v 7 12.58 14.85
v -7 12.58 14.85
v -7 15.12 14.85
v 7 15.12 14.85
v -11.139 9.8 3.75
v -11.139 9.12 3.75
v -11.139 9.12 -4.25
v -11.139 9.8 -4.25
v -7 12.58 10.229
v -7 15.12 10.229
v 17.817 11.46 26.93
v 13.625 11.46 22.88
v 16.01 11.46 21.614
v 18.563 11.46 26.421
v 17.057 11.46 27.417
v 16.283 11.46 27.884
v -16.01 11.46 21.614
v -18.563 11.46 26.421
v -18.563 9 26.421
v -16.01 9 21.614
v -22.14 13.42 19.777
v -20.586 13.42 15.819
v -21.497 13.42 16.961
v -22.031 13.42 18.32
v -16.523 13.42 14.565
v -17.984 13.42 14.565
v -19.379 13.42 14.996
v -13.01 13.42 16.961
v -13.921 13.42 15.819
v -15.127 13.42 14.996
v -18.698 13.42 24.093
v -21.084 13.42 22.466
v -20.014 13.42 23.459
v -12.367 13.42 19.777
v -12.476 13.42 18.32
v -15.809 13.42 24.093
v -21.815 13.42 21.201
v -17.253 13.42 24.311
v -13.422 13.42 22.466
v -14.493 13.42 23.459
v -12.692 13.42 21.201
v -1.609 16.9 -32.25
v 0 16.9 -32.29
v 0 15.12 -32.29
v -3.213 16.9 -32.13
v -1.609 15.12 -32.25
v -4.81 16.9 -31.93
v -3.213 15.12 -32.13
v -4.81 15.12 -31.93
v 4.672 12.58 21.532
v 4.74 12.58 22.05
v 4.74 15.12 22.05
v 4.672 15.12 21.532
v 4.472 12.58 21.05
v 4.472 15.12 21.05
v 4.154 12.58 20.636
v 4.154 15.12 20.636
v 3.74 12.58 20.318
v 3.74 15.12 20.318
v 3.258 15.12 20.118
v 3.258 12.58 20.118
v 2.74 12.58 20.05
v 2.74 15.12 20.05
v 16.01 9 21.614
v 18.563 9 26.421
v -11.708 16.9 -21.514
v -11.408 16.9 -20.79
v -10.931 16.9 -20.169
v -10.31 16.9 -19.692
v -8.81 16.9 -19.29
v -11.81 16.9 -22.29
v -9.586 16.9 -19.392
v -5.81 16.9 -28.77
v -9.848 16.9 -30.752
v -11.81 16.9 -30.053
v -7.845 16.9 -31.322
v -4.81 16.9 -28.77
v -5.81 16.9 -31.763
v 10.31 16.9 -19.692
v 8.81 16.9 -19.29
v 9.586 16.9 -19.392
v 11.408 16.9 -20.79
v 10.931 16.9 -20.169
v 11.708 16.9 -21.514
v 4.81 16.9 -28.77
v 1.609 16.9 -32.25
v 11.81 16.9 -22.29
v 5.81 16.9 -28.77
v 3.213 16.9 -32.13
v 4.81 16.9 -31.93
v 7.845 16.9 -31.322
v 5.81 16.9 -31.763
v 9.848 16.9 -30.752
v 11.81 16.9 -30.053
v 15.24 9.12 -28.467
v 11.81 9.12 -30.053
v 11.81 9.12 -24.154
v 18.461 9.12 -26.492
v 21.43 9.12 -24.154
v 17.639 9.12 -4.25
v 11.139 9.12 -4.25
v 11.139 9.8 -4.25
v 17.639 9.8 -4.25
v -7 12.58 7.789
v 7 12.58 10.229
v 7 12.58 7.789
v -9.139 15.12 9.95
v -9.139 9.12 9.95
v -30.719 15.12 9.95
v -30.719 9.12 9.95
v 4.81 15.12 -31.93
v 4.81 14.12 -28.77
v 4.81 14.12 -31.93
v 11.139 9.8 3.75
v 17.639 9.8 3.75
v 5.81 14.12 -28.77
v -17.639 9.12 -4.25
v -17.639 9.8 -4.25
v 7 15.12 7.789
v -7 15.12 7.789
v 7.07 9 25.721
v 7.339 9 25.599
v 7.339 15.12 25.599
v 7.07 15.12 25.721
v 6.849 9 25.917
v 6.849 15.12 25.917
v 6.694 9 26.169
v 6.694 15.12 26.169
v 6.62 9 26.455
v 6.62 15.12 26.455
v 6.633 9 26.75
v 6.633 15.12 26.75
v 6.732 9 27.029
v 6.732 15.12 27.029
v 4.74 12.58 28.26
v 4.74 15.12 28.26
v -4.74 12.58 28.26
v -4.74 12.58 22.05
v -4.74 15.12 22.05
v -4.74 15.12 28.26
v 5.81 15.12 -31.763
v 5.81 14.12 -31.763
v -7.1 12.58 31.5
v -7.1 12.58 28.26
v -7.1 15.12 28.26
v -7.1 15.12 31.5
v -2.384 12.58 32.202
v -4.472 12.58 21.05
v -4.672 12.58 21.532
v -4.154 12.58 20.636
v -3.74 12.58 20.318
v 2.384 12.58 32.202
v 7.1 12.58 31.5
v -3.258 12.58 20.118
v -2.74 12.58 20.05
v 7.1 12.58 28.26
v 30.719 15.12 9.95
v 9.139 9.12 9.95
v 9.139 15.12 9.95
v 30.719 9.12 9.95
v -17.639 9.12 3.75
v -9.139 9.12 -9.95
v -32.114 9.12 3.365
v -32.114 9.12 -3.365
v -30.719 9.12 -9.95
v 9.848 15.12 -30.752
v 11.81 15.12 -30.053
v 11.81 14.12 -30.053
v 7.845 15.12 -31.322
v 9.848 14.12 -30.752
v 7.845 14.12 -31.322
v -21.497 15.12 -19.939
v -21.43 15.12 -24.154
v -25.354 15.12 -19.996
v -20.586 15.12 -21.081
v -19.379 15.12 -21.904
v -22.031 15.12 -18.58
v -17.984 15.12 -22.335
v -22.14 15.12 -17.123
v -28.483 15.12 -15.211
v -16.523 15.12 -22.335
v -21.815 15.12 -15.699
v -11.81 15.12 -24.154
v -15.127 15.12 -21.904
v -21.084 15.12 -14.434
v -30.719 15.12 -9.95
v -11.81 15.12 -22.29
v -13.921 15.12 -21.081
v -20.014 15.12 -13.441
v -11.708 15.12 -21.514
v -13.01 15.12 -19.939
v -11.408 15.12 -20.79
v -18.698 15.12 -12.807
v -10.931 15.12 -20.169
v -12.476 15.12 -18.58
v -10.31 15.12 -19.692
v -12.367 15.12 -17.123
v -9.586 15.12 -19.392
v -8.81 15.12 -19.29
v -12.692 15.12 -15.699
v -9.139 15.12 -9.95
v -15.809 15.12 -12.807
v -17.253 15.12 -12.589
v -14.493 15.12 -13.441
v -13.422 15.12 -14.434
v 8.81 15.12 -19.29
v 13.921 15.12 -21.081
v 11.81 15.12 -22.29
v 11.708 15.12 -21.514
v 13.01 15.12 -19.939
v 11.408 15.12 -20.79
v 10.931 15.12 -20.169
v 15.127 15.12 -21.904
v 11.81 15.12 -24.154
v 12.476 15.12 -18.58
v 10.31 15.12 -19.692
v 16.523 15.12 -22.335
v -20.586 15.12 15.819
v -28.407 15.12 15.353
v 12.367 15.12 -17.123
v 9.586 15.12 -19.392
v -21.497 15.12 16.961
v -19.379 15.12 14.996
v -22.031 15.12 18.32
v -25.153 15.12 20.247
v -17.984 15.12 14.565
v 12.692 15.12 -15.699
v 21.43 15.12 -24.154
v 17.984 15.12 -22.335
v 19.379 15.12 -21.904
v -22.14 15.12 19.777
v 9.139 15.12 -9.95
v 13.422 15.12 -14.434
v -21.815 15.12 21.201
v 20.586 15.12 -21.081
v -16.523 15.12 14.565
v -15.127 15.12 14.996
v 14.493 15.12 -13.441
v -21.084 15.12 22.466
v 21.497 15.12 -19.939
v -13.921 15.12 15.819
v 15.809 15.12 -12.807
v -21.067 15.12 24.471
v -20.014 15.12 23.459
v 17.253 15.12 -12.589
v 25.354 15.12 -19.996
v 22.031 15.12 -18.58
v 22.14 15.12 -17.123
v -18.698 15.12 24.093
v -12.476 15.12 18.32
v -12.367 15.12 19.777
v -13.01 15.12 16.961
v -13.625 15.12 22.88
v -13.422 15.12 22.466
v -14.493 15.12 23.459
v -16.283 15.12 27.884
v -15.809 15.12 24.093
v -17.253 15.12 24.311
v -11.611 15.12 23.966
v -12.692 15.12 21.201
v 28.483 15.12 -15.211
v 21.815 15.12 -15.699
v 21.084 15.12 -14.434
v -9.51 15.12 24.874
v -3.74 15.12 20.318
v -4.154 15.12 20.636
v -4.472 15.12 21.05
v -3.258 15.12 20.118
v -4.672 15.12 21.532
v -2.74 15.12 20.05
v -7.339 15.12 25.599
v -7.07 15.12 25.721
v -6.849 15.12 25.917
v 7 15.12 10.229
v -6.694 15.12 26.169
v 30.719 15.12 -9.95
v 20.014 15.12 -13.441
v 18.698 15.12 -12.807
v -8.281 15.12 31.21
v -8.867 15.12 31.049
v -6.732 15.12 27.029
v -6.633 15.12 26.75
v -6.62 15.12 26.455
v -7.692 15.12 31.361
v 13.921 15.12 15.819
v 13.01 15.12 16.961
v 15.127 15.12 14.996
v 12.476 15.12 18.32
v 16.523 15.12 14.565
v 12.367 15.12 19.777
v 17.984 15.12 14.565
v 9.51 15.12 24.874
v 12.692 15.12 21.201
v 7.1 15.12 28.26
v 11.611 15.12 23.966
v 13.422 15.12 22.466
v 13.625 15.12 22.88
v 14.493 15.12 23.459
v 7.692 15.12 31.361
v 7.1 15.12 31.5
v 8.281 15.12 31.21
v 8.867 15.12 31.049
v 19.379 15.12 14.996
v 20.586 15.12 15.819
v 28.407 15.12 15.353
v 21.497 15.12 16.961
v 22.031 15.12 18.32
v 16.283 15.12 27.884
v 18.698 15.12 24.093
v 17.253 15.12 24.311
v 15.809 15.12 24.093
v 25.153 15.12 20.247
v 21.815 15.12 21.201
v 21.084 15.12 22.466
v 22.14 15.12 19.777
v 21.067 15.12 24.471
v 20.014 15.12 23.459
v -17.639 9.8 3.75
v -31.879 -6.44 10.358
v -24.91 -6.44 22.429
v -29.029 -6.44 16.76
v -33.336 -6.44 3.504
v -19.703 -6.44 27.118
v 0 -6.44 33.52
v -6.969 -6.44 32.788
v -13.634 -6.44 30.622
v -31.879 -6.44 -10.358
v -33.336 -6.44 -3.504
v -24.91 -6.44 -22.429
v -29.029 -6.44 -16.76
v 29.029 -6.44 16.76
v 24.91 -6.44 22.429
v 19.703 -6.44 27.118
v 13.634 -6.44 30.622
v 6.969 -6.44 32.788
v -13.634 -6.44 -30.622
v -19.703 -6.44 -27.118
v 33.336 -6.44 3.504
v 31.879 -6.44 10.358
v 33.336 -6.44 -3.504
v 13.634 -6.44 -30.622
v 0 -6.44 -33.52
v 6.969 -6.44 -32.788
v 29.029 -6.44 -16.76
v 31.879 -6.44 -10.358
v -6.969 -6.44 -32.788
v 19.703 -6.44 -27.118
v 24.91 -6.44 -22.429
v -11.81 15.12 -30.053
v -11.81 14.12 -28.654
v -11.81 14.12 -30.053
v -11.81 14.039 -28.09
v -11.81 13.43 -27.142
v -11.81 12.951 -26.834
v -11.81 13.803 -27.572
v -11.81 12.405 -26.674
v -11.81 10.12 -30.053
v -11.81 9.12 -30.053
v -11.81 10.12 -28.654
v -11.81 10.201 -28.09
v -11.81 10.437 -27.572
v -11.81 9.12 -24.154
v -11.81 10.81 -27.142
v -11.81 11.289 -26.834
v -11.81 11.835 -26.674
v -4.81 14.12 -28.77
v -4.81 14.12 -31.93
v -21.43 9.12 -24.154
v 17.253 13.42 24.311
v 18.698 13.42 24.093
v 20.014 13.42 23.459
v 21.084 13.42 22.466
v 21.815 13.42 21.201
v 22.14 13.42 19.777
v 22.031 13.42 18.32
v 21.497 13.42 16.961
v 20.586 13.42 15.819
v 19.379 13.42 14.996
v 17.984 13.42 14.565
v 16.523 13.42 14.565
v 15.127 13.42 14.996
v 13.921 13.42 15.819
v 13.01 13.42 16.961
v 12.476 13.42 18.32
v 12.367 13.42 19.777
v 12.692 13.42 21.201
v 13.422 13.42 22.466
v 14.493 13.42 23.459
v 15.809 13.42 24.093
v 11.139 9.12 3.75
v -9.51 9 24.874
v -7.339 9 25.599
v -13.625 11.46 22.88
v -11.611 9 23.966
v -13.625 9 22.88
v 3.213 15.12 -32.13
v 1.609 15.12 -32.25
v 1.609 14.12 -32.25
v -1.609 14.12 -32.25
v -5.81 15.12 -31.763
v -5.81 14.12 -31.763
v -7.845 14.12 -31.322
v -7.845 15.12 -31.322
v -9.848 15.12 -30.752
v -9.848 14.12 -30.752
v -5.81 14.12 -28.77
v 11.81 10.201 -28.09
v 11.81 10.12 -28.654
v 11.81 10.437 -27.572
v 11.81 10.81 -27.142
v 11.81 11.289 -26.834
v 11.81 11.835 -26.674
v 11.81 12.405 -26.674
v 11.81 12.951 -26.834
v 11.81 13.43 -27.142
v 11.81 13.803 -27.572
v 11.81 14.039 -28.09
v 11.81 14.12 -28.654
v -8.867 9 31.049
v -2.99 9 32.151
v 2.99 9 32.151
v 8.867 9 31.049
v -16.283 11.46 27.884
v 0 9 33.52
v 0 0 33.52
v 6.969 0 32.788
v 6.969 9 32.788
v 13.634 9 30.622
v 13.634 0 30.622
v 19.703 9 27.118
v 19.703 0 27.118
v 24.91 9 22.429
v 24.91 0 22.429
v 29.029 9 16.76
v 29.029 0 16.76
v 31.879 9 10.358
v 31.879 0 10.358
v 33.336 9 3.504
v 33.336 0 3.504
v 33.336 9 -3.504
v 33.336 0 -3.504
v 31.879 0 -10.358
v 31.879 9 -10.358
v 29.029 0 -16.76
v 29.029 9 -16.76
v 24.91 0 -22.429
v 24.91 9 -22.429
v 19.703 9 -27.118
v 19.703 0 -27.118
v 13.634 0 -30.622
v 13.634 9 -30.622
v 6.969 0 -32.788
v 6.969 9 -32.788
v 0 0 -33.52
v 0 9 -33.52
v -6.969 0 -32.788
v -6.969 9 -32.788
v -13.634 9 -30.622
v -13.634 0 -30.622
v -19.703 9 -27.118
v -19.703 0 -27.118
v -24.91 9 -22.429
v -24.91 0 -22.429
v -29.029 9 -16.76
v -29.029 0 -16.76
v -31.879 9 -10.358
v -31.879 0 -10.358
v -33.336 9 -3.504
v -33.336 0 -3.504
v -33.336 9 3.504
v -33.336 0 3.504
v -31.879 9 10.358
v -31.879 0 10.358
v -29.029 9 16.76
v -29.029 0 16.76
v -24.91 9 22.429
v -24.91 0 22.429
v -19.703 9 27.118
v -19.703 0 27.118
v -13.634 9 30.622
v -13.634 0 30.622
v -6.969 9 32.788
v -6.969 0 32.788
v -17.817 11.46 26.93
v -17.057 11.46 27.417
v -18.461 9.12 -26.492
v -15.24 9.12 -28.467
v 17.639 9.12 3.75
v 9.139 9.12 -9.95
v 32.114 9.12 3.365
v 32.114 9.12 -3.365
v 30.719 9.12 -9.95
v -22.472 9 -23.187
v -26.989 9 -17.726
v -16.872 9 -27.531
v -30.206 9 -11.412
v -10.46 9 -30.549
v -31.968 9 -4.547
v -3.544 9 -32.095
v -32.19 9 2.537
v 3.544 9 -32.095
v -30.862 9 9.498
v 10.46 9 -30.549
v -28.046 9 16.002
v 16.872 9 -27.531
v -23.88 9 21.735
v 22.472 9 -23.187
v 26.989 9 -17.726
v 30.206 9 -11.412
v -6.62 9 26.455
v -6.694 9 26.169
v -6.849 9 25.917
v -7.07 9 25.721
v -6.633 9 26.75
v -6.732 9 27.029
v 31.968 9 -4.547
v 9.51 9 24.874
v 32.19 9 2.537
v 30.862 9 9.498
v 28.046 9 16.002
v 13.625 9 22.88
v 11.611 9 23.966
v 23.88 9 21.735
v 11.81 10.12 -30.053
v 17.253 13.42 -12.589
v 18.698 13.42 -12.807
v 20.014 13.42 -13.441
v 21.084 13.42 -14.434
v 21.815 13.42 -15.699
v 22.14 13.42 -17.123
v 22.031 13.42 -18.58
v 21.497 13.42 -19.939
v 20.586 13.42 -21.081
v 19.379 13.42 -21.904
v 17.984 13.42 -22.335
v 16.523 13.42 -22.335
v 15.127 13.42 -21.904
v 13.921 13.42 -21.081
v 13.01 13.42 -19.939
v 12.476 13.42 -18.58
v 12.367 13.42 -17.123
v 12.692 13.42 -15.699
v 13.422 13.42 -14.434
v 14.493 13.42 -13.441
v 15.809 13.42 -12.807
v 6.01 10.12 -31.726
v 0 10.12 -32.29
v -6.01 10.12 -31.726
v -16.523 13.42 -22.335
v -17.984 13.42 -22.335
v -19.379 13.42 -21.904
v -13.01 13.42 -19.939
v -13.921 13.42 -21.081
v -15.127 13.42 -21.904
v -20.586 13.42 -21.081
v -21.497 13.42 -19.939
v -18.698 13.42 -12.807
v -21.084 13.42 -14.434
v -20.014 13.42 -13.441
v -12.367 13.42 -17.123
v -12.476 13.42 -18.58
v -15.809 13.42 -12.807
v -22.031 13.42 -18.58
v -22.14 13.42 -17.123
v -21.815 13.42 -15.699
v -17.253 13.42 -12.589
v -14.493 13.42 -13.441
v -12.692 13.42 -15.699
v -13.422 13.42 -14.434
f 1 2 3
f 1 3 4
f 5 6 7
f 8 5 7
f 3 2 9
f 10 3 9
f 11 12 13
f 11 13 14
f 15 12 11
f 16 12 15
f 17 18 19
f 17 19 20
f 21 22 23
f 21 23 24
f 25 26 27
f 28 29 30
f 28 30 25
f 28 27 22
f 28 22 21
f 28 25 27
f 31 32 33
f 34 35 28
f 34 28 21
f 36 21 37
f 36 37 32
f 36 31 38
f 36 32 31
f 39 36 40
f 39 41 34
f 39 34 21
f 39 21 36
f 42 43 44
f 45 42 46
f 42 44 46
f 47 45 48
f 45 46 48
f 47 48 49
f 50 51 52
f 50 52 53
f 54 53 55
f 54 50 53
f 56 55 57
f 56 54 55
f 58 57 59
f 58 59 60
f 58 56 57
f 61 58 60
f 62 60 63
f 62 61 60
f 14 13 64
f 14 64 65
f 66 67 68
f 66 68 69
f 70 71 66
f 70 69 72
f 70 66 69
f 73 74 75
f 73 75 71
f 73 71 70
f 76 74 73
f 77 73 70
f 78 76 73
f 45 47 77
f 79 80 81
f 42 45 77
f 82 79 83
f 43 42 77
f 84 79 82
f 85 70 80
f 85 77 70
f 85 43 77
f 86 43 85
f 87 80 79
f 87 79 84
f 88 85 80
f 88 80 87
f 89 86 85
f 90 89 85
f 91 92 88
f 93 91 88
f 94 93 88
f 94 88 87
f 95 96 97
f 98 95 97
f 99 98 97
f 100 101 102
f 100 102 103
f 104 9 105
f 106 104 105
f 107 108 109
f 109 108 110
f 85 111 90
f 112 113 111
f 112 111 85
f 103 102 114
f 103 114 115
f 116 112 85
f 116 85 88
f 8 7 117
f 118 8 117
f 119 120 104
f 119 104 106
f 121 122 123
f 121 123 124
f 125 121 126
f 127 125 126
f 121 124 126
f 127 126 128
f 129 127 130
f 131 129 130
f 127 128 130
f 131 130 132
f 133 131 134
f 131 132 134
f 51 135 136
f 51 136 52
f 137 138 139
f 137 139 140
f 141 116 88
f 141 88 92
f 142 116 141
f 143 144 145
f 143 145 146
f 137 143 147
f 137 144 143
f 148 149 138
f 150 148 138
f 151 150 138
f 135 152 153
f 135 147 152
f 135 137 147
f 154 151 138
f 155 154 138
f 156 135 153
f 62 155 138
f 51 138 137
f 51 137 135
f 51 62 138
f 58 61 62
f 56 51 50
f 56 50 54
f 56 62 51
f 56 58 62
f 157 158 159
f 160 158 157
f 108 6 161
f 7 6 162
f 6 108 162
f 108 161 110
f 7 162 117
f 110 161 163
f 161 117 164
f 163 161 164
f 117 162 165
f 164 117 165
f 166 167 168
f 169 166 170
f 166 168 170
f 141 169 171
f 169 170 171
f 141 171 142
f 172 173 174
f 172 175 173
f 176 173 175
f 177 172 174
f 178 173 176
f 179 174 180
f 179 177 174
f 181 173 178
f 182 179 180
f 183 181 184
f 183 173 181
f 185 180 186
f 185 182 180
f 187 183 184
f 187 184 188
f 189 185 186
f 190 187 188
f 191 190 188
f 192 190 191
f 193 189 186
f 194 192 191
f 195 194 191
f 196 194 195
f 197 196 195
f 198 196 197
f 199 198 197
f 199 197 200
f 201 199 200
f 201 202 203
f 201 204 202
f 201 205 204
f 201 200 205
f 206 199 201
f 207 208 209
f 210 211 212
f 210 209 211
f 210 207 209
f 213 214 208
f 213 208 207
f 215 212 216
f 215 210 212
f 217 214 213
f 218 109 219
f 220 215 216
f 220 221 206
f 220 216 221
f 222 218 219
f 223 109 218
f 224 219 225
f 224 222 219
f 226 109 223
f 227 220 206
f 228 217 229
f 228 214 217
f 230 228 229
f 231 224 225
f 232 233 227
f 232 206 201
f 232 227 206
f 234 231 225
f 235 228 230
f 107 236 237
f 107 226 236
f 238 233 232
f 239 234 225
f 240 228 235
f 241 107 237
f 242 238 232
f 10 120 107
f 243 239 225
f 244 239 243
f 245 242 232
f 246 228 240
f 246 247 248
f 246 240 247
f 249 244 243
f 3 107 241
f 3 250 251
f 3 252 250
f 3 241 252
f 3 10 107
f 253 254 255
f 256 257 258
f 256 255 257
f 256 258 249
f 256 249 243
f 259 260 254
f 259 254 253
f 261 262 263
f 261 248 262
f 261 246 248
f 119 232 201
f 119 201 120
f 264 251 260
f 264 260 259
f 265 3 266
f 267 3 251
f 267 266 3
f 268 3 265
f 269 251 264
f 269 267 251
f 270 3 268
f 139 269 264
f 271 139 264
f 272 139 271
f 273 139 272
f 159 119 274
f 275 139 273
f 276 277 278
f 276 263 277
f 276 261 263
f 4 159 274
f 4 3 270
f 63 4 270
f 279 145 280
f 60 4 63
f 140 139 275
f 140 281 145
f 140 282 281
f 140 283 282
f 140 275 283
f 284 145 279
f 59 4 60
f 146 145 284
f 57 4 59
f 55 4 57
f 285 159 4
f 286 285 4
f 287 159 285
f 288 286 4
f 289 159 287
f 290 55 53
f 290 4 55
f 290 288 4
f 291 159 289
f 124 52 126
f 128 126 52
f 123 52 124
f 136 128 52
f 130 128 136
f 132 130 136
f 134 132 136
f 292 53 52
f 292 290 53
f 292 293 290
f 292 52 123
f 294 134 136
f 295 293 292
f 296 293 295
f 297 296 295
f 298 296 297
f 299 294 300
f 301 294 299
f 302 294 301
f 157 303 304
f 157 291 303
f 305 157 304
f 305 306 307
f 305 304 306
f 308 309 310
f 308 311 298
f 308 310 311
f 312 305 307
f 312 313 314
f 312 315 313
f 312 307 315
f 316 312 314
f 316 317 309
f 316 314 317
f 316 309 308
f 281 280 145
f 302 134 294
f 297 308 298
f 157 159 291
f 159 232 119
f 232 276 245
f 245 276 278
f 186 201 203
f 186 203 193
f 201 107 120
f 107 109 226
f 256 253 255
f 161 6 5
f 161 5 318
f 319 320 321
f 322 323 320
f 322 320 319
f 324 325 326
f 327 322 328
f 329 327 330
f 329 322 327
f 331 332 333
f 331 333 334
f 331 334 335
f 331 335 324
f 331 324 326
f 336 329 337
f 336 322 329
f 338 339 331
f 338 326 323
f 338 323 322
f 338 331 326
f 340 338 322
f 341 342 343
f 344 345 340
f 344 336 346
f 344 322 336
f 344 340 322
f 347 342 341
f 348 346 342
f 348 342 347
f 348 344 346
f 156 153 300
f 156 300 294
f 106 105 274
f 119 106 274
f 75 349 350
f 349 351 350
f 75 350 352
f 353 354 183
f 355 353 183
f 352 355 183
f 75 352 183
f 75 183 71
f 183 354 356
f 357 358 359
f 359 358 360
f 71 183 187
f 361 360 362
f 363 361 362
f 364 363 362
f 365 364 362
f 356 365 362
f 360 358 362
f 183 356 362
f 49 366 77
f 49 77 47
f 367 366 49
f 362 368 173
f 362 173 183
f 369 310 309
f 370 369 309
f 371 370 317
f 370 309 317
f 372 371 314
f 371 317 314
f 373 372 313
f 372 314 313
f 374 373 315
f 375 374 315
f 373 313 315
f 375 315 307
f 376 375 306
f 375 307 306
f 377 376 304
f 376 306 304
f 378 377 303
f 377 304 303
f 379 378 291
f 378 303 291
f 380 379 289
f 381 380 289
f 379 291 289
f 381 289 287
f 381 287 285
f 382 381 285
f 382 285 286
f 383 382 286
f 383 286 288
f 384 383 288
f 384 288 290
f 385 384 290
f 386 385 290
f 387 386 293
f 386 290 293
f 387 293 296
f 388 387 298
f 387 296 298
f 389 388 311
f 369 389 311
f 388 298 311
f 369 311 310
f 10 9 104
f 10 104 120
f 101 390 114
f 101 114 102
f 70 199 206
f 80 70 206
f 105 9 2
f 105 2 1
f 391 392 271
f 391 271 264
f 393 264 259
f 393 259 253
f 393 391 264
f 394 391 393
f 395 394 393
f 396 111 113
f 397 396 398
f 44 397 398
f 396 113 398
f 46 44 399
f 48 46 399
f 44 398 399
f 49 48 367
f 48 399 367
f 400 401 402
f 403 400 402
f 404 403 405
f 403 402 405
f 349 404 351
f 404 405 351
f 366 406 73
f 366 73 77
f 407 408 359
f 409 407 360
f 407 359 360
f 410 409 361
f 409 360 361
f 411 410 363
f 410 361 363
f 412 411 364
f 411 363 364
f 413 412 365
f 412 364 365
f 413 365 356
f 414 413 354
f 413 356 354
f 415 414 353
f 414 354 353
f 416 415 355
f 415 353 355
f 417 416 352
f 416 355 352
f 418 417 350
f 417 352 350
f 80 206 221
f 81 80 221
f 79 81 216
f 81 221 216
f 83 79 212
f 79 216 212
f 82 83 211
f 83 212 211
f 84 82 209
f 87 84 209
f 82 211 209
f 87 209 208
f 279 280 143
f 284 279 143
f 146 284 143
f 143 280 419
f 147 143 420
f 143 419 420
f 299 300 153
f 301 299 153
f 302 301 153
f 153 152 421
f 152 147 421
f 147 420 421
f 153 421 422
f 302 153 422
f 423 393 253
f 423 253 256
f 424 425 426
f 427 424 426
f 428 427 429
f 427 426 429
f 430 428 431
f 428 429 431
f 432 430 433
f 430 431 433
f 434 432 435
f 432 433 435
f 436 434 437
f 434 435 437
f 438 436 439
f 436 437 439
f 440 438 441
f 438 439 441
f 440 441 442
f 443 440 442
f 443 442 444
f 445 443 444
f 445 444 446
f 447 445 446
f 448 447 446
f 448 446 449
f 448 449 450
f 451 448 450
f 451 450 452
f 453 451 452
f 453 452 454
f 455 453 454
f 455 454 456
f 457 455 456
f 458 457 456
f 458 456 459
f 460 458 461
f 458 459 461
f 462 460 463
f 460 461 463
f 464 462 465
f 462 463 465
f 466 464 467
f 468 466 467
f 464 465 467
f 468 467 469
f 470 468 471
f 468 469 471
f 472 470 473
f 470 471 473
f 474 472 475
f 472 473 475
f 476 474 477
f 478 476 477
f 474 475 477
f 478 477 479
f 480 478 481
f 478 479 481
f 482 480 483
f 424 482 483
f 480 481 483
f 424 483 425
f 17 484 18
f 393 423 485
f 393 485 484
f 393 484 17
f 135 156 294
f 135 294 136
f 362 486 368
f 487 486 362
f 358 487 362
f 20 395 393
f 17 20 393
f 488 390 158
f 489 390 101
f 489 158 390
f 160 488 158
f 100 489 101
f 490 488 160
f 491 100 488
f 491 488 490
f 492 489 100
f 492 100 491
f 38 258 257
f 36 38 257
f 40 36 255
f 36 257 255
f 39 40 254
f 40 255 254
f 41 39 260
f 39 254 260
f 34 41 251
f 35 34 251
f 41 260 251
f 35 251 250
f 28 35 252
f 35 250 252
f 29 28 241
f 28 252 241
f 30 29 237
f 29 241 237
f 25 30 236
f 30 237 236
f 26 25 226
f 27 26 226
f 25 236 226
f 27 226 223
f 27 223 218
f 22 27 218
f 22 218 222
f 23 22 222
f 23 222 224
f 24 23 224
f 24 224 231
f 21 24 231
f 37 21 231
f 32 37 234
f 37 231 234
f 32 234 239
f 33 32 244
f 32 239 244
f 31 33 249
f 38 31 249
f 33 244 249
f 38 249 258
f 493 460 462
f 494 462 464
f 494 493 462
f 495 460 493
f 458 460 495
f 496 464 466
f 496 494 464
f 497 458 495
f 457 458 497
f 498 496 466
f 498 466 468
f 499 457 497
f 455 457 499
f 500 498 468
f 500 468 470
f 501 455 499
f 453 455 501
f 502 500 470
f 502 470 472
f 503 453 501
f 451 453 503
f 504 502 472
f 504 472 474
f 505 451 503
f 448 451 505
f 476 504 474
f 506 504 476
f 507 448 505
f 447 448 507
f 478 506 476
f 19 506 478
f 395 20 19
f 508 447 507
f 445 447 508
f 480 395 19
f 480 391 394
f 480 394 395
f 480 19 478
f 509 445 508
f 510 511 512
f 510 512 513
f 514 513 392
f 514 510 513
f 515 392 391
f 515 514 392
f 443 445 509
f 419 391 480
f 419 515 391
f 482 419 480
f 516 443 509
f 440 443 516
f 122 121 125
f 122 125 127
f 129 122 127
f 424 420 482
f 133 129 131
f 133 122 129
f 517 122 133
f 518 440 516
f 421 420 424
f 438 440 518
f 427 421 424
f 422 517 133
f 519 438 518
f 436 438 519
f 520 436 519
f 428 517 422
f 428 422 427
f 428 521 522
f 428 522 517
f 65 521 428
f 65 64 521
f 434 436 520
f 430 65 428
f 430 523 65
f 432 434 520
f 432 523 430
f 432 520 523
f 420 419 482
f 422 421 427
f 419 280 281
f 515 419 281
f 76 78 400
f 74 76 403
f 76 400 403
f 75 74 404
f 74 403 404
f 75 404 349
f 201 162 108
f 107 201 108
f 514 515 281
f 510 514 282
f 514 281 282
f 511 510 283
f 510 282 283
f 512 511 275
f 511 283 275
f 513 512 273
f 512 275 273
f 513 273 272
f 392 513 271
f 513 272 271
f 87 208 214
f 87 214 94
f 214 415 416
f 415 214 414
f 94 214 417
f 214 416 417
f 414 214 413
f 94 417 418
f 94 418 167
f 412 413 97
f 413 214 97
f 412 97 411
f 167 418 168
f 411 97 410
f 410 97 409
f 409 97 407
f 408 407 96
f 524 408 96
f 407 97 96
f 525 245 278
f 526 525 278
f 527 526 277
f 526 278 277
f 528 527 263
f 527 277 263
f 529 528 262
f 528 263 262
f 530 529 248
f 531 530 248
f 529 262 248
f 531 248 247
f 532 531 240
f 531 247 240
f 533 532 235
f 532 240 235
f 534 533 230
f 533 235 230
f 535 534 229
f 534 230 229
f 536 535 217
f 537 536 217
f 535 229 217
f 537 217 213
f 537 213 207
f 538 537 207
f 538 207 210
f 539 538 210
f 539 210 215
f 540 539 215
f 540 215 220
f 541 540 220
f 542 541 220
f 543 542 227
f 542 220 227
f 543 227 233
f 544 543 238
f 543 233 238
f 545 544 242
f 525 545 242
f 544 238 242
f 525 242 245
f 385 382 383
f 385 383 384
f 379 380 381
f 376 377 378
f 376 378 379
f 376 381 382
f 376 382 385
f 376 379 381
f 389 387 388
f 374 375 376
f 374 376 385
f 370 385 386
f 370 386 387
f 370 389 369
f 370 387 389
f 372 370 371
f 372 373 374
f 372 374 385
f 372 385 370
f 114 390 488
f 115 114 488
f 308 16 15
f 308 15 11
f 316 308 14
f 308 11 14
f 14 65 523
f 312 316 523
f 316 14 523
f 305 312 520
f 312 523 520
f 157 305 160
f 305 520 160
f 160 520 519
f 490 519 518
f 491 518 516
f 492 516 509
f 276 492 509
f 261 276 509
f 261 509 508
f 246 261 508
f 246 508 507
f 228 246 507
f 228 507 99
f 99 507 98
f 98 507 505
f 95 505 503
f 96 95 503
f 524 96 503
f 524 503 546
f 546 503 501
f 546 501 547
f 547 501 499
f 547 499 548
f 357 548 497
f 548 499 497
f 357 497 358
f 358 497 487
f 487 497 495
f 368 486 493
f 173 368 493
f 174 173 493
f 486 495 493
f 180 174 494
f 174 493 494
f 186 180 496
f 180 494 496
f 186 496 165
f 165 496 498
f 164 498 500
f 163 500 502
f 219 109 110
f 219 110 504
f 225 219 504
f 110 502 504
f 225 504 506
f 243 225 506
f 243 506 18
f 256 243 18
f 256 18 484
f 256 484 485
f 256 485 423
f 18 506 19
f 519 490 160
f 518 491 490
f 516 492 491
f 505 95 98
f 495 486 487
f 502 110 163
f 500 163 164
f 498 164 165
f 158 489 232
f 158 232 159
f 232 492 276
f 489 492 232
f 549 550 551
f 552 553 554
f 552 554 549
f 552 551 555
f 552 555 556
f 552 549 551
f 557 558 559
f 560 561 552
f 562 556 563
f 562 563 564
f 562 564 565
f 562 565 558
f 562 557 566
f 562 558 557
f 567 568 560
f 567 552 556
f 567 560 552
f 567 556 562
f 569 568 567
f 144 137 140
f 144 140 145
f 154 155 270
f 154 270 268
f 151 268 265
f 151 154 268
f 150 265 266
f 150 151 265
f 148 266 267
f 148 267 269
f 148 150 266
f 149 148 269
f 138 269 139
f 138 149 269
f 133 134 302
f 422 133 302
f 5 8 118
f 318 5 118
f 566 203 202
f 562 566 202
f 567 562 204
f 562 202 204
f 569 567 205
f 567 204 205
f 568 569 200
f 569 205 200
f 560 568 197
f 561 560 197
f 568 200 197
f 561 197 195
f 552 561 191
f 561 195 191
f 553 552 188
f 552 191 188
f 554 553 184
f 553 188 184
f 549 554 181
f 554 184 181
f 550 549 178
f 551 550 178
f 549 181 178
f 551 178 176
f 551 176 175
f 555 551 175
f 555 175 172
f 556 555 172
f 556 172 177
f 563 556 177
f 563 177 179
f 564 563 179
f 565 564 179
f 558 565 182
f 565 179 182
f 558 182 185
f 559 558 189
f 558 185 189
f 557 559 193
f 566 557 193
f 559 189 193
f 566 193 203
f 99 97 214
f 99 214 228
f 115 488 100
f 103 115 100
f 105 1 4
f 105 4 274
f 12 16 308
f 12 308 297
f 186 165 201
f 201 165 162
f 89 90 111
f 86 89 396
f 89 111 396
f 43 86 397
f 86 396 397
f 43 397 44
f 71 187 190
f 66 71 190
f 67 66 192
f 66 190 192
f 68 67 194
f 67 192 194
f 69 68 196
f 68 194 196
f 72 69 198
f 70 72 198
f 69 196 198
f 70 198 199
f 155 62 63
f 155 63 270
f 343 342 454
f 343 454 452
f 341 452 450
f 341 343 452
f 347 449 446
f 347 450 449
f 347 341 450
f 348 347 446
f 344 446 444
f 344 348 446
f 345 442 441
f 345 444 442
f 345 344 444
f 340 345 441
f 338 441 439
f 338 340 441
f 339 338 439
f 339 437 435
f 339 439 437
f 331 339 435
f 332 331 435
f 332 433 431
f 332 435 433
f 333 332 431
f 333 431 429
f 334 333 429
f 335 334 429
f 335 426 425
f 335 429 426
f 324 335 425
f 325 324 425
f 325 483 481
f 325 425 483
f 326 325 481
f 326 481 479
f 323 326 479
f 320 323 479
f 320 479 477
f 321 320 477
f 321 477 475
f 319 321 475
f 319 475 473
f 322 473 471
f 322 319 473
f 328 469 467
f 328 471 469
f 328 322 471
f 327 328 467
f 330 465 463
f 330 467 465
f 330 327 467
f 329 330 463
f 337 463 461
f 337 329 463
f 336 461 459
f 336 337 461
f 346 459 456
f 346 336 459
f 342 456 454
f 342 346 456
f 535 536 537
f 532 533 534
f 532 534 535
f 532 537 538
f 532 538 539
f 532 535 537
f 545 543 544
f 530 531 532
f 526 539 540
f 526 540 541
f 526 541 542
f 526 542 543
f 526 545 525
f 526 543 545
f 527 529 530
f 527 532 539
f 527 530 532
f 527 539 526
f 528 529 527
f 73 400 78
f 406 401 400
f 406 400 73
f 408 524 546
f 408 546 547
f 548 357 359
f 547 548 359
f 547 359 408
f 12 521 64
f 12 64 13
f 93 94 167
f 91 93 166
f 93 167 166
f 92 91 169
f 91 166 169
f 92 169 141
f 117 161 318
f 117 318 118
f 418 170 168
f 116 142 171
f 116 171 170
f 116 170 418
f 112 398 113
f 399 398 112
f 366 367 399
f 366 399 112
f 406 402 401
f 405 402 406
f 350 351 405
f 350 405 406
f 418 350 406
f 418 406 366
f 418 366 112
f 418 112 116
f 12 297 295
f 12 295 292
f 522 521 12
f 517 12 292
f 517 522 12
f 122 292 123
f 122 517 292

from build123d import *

# Parameters (mm, degrees)
SKETCH1_R           = 33.52
BOSS_EXTRUDE1_DEPTH = 9
SKETCH2_R           = 32.29
BOSS_EXTRUDE2_DEPTH = 6.12
CUT_EXTRUDE1_START  = -6
CUT_EXTRUDE1_DEPTH  = 6
SKETCH10_R          = 2
CUT_EXTRUDE2_DEPTH  = 59.369629946
SKETCH23_W          = 6.054526745
SKETCH23_H          = 4
CUT_EXTRUDE3_DEPTH  = 59.369629972
BOSS_EXTRUDE4_DEPTH = 1.78
CUT_EXTRUDE5_START  = -6
CUT_EXTRUDE5_DEPTH  = 6
CUT_EXTRUDE6_START  = -2.54
SKETCH26_W          = 14
SKETCH26_H          = 4.621469047
CUT_EXTRUDE6_DEPTH  = 2.54
CUT_EXTRUDE7_START  = -6.12
CUT_EXTRUDE7_DEPTH  = 6.12
SKETCH26_7_R        = 4.9
CUT_EXTRUDE8_DEPTH  = 1.7
SKETCH37_W          = 5.66557495
SKETCH37_H          = 2.46
CUT_EXTRUDE13_DEPTH = 2.7
SKETCH30_W          = 5.66557495
SKETCH30_H          = 2.46
CUT_EXTRUDE14_DEPTH = 2.7
SKETCH40_W          = 6.5
SKETCH40_H          = 8
BOSS_EXTRUDE5_DEPTH = 0.68
CUT_EXTRUDE15_START = -4.1
CUT_EXTRUDE15_DEPTH = 4.1
BOSS_EXTRUDE6_START = 6.44
SKETCH41_R          = 33.52
BOSS_EXTRUDE6_DEPTH = 6.44
SKETCH43_W          = 14
SKETCH43_H          = 2.54
CUT_EXTRUDE16_DEPTH = 2.44
FILLET1_R           = 1
FILLET2_R           = 1


with BuildPart() as part:
    # Sketch1 → Boss-Extrude1 (new body)
    with BuildSketch(Plane(origin=(0, 0, 0), x_dir=(1, 0, 0), z_dir=(0, 1, 0))):
        with Locations(Location((0, 0, 0), (0, 0, 270))):
            Circle(SKETCH1_R)
    extrude(amount=BOSS_EXTRUDE1_DEPTH)

    # Sketch2 → Boss-Extrude2 (add)
    with BuildSketch(Plane(origin=(0, 9, 0), x_dir=(1, 0, 0), z_dir=(0, 1, 0))):
        with Locations(Location((0, 0, 0), (0, 0, 270))):
            Circle(SKETCH2_R)
    extrude(amount=BOSS_EXTRUDE2_DEPTH)

    # Sketch3 → Cut-Extrude1 (cut)
    with BuildSketch(Plane(origin=(0, 15.12, 0), x_dir=(1, 0, 0), z_dir=(0, 1, 0)).offset(CUT_EXTRUDE1_START)):
        with BuildLine():
            Line((-11.81, 24.153658108), (-11.81, 30.052753618))
            ThreePointArc((-11.81, 30.052753618), (-16.879698811, 27.5267119), (-21.43, 24.153658108))
            Line((-21.43, 24.153658108), (-11.81, 24.153658108))
        make_face()
        with BuildLine():
            ThreePointArc((21.43, 24.153658108), (16.879698811, 27.5267119), (11.81, 30.052753618))
            Line((11.81, 30.052753618), (11.81, 24.153658108))
            Line((11.81, 24.153658108), (21.43, 24.153658108))
        make_face()
    extrude(amount=CUT_EXTRUDE1_DEPTH, mode=Mode.SUBTRACT)

    # Sketch10 → Cut-Extrude2 (cut, through all)
    with BuildSketch(Plane.ZY.offset(11.81)):
        with Locations(Location((-28.653658108, 12.12, 0), (0, 0, 134.390731556))):
            Circle(SKETCH10_R)
    extrude(amount=-CUT_EXTRUDE2_DEPTH, mode=Mode.SUBTRACT)

    # Sketch23 → Cut-Extrude3 (cut, through all)
    with BuildSketch(Plane.ZY.offset(11.81)):
        with Locations((-31.680921481, 12.12)):
            Rectangle(SKETCH23_W, SKETCH23_H)
    extrude(amount=-CUT_EXTRUDE3_DEPTH, mode=Mode.SUBTRACT)

    # Sketch24 → Boss-Extrude4 (add)
    with BuildSketch(Plane(origin=(0, 15.12, 0), x_dir=(1, 0, 0), z_dir=(0, 1, 0))):
        with BuildLine():
            ThreePointArc((0, 32.29), (-6.010020203, 31.725758575), (-11.81, 30.052753618))
            Line((-11.81, 30.052753618), (-11.81, 24.153658108))
            Line((-11.81, 24.153658108), (-11.81, 22.29))
            ThreePointArc((-11.81, 22.29), (-10.931320344, 20.168679656), (-8.81, 19.29))
            Line((-8.81, 19.29), (0, 19.29))
            Line((0, 19.29), (0, 32.29))
        make_face()
        with BuildLine():
            ThreePointArc((11.81, 30.052753618), (6.010020203, 31.725758575), (0, 32.29))
            Line((0, 32.29), (0, 19.29))
            Line((0, 19.29), (8.81, 19.29))
            ThreePointArc((8.81, 19.29), (10.931320344, 20.168679656), (11.81, 22.29))
            Line((11.81, 22.29), (11.81, 24.153658108))
            Line((11.81, 24.153658108), (11.81, 30.052753618))
        make_face()
    extrude(amount=BOSS_EXTRUDE4_DEPTH)

    # Sketch26<4> → Cut-Extrude5 (cut)
    with BuildSketch(Plane(origin=(0, 15.12, 0), x_dir=(1, 0, 0), z_dir=(0, 1, 0)).offset(CUT_EXTRUDE5_START)):
        with BuildLine():
            ThreePointArc((30.718749975, -9.95), (32.29, 0), (30.718749975, 9.95))
            Line((30.718749975, 9.95), (9.138749975, 9.95))
            Line((9.138749975, 9.95), (9.138749975, -9.95))
            Line((9.138749975, -9.95), (30.718749975, -9.95))
        make_face()
    cut_extrude5 = extrude(amount=CUT_EXTRUDE5_DEPTH, mode=Mode.SUBTRACT)

    # Sketch26 → Cut-Extrude6 (cut)
    with BuildSketch(Plane(origin=(0, 15.12, 0), x_dir=(1, 0, 0), z_dir=(0, 1, 0)).offset(CUT_EXTRUDE6_START)):
        with BuildLine():
            ThreePointArc((-7.1, -31.499747618), (0, -32.29), (7.1, -31.499747618))
            Line((7.1, -31.499747618), (7.1, -28.259676136))
            Line((7.1, -28.259676136), (4.74, -28.259676136))
            Line((4.74, -28.259676136), (4.74, -26.204757202))
            Line((4.74, -26.204757202), (4.74, -22.05))
            ThreePointArc((4.74, -22.05), (4.154213562, -20.635786438), (2.74, -20.05))
            Line((2.74, -20.05), (-2.74, -20.05))
            ThreePointArc((-2.74, -20.05), (-4.154213562, -20.635786438), (-4.74, -22.05))
            Line((-4.74, -22.05), (-4.74, -26.204757202))
            Line((-4.74, -26.204757202), (-4.74, -28.259676136))
            Line((-4.74, -28.259676136), (-7.1, -28.259676136))
            Line((-7.1, -28.259676136), (-7.1, -31.499747618))
        make_face()
        with Locations((0, -12.539265477)):
            Rectangle(SKETCH26_W, SKETCH26_H)
    extrude(amount=CUT_EXTRUDE6_DEPTH, mode=Mode.SUBTRACT)

    # Sketch28 → Cut-Extrude7 (cut)
    with BuildSketch(Plane(origin=(0, 15.12, 0), x_dir=(1, 0, 0), z_dir=(0, 1, 0)).offset(CUT_EXTRUDE7_START)):
        with BuildLine():
            ThreePointArc((-6.138643472, -25.91281452), (-9.99763899, -24.682060583), (-13.62533551, -22.880278238))
            Line((-13.62533551, -22.880278238), (-16.282957683, -27.883855348))
            ThreePointArc((-16.282957683, -27.883855348), (-12.673955944, -29.698736349), (-8.866590913, -31.048794913))
            Line((-8.866590913, -31.048794913), (-6.138643472, -25.91281452))
        make_face()
        with BuildLine():
            ThreePointArc((13.62533551, -22.880278238), (9.99763899, -24.682060583), (6.138643472, -25.91281452))
            Line((6.138643472, -25.91281452), (8.866590913, -31.048794913))
            ThreePointArc((8.866590913, -31.048794913), (12.673955944, -29.698736349), (16.282957683, -27.883855348))
            Line((16.282957683, -27.883855348), (13.62533551, -22.880278238))
        make_face()
    extrude(amount=CUT_EXTRUDE7_DEPTH, mode=Mode.SUBTRACT)

    # Sketch26<7> → Cut-Extrude8 (cut)
    with BuildSketch(Plane(origin=(0, 15.12, 0), x_dir=(1, 0, 0), z_dir=(0, 1, 0))):
        with Locations(Location((17.253376134, 17.489232673, 0), (0, 0, 270))):
            Circle(SKETCH26_7_R)
        with Locations(Location((17.253376134, -19.410767327, 0), (0, 0, 270))):
            Circle(SKETCH26_7_R)
        with Locations(Location((-17.253376134, -19.410767327, 0), (0, 0, 270))):
            Circle(SKETCH26_7_R)
        with Locations(Location((-17.253376134, 17.489232673, 0), (0, 0, 270))):
            Circle(SKETCH26_7_R)
    extrude(amount=-CUT_EXTRUDE8_DEPTH, mode=Mode.SUBTRACT)

    # Sketch37 → Cut-Extrude13 (cut)
    with BuildSketch(Plane(origin=(1.148573691, 0, -0.610058532), x_dir=(0.4690825196866177, 0, 0.8831543408286312), z_dir=(-0.8831543408286312, 0, 0.4690825196866177))):
        with Locations((29.431011233, 10.23)):
            Rectangle(SKETCH37_W, SKETCH37_H)
    extrude(amount=-CUT_EXTRUDE13_DEPTH, mode=Mode.SUBTRACT)

    # Sketch30 → Cut-Extrude14 (cut)
    with BuildSketch(Plane(origin=(-1.148573691, 0, -0.610058532), x_dir=(0.4690825196866177, 0, -0.8831543408286312), z_dir=(0.8831543408286312, 0, 0.4690825196866177))):
        with Locations((-29.431011233, 10.23)):
            Rectangle(SKETCH30_W, SKETCH30_H)
    extrude(amount=-CUT_EXTRUDE14_DEPTH, mode=Mode.SUBTRACT)

    # Sketch40 → Boss-Extrude5 (add)
    with BuildSketch(Plane(origin=(0, 9.12, 0), x_dir=(1, 0, 0), z_dir=(0, 1, 0))):
        with Locations((14.388749975, 0.25)):
            Rectangle(SKETCH40_W, SKETCH40_H)
    boss_extrude5 = extrude(amount=BOSS_EXTRUDE5_DEPTH)

    # Sketch31 → Cut-Extrude15 (cut)
    with BuildSketch(Plane(origin=(0, 16.9, 0), x_dir=(1, 0, 0), z_dir=(0, 1, 0)).offset(CUT_EXTRUDE15_START)):
        with BuildLine():
            ThreePointArc((-4.81, 31.929735358), (-5.310654422, 31.850291201), (-5.81, 31.76299734))
            Line((-5.81, 31.76299734), (-5.81, 28.77))
            Line((-5.81, 28.77), (-4.81, 28.77))
            Line((-4.81, 28.77), (-4.81, 31.929735358))
        make_face()
        with BuildLine():
            ThreePointArc((5.81, 31.76299734), (5.310654422, 31.850291201), (4.81, 31.929735358))
            Line((4.81, 31.929735358), (4.81, 28.77))
            Line((4.81, 28.77), (5.81, 28.77))
            Line((5.81, 28.77), (5.81, 31.76299734))
        make_face()
    extrude(amount=CUT_EXTRUDE15_DEPTH, mode=Mode.SUBTRACT)

    # Sketch41 → Boss-Extrude6 (add)
    with BuildSketch(Plane.XZ.offset(BOSS_EXTRUDE6_START)):
        with Locations(Location((0, 0, 0), (0, 0, 270))):
            Circle(SKETCH41_R)
    extrude(amount=-BOSS_EXTRUDE6_DEPTH)

    # Sketch43 → Cut-Extrude16 (cut)
    with BuildSketch(Plane.XY.offset(10.228530953)):
        with Locations((0, 13.85)):
            Rectangle(SKETCH43_W, SKETCH43_H)
    extrude(amount=-CUT_EXTRUDE16_DEPTH, mode=Mode.SUBTRACT)

    # Mirror1: Cut-Extrude5 across plane
    add(cut_extrude5.mirror(Plane.ZY), mode=Mode.SUBTRACT)

    # Mirror2: Boss-Extrude5 across plane
    add(boss_extrude5.mirror(Plane.ZY))

    # Fillet1
    fillet1_edges = [part.edges().sort_by_distance(p)[0] for p in [
        (6.138643472, 12.06, 25.91281452),
    ]]
    fillet(fillet1_edges, radius=FILLET1_R)

    # Fillet2
    fillet2_edges = [part.edges().sort_by_distance(p)[0] for p in [
        (-6.138643472, 12.06, 25.91281452),
    ]]
    fillet(fillet2_edges, radius=FILLET2_R)


solid = part.part
